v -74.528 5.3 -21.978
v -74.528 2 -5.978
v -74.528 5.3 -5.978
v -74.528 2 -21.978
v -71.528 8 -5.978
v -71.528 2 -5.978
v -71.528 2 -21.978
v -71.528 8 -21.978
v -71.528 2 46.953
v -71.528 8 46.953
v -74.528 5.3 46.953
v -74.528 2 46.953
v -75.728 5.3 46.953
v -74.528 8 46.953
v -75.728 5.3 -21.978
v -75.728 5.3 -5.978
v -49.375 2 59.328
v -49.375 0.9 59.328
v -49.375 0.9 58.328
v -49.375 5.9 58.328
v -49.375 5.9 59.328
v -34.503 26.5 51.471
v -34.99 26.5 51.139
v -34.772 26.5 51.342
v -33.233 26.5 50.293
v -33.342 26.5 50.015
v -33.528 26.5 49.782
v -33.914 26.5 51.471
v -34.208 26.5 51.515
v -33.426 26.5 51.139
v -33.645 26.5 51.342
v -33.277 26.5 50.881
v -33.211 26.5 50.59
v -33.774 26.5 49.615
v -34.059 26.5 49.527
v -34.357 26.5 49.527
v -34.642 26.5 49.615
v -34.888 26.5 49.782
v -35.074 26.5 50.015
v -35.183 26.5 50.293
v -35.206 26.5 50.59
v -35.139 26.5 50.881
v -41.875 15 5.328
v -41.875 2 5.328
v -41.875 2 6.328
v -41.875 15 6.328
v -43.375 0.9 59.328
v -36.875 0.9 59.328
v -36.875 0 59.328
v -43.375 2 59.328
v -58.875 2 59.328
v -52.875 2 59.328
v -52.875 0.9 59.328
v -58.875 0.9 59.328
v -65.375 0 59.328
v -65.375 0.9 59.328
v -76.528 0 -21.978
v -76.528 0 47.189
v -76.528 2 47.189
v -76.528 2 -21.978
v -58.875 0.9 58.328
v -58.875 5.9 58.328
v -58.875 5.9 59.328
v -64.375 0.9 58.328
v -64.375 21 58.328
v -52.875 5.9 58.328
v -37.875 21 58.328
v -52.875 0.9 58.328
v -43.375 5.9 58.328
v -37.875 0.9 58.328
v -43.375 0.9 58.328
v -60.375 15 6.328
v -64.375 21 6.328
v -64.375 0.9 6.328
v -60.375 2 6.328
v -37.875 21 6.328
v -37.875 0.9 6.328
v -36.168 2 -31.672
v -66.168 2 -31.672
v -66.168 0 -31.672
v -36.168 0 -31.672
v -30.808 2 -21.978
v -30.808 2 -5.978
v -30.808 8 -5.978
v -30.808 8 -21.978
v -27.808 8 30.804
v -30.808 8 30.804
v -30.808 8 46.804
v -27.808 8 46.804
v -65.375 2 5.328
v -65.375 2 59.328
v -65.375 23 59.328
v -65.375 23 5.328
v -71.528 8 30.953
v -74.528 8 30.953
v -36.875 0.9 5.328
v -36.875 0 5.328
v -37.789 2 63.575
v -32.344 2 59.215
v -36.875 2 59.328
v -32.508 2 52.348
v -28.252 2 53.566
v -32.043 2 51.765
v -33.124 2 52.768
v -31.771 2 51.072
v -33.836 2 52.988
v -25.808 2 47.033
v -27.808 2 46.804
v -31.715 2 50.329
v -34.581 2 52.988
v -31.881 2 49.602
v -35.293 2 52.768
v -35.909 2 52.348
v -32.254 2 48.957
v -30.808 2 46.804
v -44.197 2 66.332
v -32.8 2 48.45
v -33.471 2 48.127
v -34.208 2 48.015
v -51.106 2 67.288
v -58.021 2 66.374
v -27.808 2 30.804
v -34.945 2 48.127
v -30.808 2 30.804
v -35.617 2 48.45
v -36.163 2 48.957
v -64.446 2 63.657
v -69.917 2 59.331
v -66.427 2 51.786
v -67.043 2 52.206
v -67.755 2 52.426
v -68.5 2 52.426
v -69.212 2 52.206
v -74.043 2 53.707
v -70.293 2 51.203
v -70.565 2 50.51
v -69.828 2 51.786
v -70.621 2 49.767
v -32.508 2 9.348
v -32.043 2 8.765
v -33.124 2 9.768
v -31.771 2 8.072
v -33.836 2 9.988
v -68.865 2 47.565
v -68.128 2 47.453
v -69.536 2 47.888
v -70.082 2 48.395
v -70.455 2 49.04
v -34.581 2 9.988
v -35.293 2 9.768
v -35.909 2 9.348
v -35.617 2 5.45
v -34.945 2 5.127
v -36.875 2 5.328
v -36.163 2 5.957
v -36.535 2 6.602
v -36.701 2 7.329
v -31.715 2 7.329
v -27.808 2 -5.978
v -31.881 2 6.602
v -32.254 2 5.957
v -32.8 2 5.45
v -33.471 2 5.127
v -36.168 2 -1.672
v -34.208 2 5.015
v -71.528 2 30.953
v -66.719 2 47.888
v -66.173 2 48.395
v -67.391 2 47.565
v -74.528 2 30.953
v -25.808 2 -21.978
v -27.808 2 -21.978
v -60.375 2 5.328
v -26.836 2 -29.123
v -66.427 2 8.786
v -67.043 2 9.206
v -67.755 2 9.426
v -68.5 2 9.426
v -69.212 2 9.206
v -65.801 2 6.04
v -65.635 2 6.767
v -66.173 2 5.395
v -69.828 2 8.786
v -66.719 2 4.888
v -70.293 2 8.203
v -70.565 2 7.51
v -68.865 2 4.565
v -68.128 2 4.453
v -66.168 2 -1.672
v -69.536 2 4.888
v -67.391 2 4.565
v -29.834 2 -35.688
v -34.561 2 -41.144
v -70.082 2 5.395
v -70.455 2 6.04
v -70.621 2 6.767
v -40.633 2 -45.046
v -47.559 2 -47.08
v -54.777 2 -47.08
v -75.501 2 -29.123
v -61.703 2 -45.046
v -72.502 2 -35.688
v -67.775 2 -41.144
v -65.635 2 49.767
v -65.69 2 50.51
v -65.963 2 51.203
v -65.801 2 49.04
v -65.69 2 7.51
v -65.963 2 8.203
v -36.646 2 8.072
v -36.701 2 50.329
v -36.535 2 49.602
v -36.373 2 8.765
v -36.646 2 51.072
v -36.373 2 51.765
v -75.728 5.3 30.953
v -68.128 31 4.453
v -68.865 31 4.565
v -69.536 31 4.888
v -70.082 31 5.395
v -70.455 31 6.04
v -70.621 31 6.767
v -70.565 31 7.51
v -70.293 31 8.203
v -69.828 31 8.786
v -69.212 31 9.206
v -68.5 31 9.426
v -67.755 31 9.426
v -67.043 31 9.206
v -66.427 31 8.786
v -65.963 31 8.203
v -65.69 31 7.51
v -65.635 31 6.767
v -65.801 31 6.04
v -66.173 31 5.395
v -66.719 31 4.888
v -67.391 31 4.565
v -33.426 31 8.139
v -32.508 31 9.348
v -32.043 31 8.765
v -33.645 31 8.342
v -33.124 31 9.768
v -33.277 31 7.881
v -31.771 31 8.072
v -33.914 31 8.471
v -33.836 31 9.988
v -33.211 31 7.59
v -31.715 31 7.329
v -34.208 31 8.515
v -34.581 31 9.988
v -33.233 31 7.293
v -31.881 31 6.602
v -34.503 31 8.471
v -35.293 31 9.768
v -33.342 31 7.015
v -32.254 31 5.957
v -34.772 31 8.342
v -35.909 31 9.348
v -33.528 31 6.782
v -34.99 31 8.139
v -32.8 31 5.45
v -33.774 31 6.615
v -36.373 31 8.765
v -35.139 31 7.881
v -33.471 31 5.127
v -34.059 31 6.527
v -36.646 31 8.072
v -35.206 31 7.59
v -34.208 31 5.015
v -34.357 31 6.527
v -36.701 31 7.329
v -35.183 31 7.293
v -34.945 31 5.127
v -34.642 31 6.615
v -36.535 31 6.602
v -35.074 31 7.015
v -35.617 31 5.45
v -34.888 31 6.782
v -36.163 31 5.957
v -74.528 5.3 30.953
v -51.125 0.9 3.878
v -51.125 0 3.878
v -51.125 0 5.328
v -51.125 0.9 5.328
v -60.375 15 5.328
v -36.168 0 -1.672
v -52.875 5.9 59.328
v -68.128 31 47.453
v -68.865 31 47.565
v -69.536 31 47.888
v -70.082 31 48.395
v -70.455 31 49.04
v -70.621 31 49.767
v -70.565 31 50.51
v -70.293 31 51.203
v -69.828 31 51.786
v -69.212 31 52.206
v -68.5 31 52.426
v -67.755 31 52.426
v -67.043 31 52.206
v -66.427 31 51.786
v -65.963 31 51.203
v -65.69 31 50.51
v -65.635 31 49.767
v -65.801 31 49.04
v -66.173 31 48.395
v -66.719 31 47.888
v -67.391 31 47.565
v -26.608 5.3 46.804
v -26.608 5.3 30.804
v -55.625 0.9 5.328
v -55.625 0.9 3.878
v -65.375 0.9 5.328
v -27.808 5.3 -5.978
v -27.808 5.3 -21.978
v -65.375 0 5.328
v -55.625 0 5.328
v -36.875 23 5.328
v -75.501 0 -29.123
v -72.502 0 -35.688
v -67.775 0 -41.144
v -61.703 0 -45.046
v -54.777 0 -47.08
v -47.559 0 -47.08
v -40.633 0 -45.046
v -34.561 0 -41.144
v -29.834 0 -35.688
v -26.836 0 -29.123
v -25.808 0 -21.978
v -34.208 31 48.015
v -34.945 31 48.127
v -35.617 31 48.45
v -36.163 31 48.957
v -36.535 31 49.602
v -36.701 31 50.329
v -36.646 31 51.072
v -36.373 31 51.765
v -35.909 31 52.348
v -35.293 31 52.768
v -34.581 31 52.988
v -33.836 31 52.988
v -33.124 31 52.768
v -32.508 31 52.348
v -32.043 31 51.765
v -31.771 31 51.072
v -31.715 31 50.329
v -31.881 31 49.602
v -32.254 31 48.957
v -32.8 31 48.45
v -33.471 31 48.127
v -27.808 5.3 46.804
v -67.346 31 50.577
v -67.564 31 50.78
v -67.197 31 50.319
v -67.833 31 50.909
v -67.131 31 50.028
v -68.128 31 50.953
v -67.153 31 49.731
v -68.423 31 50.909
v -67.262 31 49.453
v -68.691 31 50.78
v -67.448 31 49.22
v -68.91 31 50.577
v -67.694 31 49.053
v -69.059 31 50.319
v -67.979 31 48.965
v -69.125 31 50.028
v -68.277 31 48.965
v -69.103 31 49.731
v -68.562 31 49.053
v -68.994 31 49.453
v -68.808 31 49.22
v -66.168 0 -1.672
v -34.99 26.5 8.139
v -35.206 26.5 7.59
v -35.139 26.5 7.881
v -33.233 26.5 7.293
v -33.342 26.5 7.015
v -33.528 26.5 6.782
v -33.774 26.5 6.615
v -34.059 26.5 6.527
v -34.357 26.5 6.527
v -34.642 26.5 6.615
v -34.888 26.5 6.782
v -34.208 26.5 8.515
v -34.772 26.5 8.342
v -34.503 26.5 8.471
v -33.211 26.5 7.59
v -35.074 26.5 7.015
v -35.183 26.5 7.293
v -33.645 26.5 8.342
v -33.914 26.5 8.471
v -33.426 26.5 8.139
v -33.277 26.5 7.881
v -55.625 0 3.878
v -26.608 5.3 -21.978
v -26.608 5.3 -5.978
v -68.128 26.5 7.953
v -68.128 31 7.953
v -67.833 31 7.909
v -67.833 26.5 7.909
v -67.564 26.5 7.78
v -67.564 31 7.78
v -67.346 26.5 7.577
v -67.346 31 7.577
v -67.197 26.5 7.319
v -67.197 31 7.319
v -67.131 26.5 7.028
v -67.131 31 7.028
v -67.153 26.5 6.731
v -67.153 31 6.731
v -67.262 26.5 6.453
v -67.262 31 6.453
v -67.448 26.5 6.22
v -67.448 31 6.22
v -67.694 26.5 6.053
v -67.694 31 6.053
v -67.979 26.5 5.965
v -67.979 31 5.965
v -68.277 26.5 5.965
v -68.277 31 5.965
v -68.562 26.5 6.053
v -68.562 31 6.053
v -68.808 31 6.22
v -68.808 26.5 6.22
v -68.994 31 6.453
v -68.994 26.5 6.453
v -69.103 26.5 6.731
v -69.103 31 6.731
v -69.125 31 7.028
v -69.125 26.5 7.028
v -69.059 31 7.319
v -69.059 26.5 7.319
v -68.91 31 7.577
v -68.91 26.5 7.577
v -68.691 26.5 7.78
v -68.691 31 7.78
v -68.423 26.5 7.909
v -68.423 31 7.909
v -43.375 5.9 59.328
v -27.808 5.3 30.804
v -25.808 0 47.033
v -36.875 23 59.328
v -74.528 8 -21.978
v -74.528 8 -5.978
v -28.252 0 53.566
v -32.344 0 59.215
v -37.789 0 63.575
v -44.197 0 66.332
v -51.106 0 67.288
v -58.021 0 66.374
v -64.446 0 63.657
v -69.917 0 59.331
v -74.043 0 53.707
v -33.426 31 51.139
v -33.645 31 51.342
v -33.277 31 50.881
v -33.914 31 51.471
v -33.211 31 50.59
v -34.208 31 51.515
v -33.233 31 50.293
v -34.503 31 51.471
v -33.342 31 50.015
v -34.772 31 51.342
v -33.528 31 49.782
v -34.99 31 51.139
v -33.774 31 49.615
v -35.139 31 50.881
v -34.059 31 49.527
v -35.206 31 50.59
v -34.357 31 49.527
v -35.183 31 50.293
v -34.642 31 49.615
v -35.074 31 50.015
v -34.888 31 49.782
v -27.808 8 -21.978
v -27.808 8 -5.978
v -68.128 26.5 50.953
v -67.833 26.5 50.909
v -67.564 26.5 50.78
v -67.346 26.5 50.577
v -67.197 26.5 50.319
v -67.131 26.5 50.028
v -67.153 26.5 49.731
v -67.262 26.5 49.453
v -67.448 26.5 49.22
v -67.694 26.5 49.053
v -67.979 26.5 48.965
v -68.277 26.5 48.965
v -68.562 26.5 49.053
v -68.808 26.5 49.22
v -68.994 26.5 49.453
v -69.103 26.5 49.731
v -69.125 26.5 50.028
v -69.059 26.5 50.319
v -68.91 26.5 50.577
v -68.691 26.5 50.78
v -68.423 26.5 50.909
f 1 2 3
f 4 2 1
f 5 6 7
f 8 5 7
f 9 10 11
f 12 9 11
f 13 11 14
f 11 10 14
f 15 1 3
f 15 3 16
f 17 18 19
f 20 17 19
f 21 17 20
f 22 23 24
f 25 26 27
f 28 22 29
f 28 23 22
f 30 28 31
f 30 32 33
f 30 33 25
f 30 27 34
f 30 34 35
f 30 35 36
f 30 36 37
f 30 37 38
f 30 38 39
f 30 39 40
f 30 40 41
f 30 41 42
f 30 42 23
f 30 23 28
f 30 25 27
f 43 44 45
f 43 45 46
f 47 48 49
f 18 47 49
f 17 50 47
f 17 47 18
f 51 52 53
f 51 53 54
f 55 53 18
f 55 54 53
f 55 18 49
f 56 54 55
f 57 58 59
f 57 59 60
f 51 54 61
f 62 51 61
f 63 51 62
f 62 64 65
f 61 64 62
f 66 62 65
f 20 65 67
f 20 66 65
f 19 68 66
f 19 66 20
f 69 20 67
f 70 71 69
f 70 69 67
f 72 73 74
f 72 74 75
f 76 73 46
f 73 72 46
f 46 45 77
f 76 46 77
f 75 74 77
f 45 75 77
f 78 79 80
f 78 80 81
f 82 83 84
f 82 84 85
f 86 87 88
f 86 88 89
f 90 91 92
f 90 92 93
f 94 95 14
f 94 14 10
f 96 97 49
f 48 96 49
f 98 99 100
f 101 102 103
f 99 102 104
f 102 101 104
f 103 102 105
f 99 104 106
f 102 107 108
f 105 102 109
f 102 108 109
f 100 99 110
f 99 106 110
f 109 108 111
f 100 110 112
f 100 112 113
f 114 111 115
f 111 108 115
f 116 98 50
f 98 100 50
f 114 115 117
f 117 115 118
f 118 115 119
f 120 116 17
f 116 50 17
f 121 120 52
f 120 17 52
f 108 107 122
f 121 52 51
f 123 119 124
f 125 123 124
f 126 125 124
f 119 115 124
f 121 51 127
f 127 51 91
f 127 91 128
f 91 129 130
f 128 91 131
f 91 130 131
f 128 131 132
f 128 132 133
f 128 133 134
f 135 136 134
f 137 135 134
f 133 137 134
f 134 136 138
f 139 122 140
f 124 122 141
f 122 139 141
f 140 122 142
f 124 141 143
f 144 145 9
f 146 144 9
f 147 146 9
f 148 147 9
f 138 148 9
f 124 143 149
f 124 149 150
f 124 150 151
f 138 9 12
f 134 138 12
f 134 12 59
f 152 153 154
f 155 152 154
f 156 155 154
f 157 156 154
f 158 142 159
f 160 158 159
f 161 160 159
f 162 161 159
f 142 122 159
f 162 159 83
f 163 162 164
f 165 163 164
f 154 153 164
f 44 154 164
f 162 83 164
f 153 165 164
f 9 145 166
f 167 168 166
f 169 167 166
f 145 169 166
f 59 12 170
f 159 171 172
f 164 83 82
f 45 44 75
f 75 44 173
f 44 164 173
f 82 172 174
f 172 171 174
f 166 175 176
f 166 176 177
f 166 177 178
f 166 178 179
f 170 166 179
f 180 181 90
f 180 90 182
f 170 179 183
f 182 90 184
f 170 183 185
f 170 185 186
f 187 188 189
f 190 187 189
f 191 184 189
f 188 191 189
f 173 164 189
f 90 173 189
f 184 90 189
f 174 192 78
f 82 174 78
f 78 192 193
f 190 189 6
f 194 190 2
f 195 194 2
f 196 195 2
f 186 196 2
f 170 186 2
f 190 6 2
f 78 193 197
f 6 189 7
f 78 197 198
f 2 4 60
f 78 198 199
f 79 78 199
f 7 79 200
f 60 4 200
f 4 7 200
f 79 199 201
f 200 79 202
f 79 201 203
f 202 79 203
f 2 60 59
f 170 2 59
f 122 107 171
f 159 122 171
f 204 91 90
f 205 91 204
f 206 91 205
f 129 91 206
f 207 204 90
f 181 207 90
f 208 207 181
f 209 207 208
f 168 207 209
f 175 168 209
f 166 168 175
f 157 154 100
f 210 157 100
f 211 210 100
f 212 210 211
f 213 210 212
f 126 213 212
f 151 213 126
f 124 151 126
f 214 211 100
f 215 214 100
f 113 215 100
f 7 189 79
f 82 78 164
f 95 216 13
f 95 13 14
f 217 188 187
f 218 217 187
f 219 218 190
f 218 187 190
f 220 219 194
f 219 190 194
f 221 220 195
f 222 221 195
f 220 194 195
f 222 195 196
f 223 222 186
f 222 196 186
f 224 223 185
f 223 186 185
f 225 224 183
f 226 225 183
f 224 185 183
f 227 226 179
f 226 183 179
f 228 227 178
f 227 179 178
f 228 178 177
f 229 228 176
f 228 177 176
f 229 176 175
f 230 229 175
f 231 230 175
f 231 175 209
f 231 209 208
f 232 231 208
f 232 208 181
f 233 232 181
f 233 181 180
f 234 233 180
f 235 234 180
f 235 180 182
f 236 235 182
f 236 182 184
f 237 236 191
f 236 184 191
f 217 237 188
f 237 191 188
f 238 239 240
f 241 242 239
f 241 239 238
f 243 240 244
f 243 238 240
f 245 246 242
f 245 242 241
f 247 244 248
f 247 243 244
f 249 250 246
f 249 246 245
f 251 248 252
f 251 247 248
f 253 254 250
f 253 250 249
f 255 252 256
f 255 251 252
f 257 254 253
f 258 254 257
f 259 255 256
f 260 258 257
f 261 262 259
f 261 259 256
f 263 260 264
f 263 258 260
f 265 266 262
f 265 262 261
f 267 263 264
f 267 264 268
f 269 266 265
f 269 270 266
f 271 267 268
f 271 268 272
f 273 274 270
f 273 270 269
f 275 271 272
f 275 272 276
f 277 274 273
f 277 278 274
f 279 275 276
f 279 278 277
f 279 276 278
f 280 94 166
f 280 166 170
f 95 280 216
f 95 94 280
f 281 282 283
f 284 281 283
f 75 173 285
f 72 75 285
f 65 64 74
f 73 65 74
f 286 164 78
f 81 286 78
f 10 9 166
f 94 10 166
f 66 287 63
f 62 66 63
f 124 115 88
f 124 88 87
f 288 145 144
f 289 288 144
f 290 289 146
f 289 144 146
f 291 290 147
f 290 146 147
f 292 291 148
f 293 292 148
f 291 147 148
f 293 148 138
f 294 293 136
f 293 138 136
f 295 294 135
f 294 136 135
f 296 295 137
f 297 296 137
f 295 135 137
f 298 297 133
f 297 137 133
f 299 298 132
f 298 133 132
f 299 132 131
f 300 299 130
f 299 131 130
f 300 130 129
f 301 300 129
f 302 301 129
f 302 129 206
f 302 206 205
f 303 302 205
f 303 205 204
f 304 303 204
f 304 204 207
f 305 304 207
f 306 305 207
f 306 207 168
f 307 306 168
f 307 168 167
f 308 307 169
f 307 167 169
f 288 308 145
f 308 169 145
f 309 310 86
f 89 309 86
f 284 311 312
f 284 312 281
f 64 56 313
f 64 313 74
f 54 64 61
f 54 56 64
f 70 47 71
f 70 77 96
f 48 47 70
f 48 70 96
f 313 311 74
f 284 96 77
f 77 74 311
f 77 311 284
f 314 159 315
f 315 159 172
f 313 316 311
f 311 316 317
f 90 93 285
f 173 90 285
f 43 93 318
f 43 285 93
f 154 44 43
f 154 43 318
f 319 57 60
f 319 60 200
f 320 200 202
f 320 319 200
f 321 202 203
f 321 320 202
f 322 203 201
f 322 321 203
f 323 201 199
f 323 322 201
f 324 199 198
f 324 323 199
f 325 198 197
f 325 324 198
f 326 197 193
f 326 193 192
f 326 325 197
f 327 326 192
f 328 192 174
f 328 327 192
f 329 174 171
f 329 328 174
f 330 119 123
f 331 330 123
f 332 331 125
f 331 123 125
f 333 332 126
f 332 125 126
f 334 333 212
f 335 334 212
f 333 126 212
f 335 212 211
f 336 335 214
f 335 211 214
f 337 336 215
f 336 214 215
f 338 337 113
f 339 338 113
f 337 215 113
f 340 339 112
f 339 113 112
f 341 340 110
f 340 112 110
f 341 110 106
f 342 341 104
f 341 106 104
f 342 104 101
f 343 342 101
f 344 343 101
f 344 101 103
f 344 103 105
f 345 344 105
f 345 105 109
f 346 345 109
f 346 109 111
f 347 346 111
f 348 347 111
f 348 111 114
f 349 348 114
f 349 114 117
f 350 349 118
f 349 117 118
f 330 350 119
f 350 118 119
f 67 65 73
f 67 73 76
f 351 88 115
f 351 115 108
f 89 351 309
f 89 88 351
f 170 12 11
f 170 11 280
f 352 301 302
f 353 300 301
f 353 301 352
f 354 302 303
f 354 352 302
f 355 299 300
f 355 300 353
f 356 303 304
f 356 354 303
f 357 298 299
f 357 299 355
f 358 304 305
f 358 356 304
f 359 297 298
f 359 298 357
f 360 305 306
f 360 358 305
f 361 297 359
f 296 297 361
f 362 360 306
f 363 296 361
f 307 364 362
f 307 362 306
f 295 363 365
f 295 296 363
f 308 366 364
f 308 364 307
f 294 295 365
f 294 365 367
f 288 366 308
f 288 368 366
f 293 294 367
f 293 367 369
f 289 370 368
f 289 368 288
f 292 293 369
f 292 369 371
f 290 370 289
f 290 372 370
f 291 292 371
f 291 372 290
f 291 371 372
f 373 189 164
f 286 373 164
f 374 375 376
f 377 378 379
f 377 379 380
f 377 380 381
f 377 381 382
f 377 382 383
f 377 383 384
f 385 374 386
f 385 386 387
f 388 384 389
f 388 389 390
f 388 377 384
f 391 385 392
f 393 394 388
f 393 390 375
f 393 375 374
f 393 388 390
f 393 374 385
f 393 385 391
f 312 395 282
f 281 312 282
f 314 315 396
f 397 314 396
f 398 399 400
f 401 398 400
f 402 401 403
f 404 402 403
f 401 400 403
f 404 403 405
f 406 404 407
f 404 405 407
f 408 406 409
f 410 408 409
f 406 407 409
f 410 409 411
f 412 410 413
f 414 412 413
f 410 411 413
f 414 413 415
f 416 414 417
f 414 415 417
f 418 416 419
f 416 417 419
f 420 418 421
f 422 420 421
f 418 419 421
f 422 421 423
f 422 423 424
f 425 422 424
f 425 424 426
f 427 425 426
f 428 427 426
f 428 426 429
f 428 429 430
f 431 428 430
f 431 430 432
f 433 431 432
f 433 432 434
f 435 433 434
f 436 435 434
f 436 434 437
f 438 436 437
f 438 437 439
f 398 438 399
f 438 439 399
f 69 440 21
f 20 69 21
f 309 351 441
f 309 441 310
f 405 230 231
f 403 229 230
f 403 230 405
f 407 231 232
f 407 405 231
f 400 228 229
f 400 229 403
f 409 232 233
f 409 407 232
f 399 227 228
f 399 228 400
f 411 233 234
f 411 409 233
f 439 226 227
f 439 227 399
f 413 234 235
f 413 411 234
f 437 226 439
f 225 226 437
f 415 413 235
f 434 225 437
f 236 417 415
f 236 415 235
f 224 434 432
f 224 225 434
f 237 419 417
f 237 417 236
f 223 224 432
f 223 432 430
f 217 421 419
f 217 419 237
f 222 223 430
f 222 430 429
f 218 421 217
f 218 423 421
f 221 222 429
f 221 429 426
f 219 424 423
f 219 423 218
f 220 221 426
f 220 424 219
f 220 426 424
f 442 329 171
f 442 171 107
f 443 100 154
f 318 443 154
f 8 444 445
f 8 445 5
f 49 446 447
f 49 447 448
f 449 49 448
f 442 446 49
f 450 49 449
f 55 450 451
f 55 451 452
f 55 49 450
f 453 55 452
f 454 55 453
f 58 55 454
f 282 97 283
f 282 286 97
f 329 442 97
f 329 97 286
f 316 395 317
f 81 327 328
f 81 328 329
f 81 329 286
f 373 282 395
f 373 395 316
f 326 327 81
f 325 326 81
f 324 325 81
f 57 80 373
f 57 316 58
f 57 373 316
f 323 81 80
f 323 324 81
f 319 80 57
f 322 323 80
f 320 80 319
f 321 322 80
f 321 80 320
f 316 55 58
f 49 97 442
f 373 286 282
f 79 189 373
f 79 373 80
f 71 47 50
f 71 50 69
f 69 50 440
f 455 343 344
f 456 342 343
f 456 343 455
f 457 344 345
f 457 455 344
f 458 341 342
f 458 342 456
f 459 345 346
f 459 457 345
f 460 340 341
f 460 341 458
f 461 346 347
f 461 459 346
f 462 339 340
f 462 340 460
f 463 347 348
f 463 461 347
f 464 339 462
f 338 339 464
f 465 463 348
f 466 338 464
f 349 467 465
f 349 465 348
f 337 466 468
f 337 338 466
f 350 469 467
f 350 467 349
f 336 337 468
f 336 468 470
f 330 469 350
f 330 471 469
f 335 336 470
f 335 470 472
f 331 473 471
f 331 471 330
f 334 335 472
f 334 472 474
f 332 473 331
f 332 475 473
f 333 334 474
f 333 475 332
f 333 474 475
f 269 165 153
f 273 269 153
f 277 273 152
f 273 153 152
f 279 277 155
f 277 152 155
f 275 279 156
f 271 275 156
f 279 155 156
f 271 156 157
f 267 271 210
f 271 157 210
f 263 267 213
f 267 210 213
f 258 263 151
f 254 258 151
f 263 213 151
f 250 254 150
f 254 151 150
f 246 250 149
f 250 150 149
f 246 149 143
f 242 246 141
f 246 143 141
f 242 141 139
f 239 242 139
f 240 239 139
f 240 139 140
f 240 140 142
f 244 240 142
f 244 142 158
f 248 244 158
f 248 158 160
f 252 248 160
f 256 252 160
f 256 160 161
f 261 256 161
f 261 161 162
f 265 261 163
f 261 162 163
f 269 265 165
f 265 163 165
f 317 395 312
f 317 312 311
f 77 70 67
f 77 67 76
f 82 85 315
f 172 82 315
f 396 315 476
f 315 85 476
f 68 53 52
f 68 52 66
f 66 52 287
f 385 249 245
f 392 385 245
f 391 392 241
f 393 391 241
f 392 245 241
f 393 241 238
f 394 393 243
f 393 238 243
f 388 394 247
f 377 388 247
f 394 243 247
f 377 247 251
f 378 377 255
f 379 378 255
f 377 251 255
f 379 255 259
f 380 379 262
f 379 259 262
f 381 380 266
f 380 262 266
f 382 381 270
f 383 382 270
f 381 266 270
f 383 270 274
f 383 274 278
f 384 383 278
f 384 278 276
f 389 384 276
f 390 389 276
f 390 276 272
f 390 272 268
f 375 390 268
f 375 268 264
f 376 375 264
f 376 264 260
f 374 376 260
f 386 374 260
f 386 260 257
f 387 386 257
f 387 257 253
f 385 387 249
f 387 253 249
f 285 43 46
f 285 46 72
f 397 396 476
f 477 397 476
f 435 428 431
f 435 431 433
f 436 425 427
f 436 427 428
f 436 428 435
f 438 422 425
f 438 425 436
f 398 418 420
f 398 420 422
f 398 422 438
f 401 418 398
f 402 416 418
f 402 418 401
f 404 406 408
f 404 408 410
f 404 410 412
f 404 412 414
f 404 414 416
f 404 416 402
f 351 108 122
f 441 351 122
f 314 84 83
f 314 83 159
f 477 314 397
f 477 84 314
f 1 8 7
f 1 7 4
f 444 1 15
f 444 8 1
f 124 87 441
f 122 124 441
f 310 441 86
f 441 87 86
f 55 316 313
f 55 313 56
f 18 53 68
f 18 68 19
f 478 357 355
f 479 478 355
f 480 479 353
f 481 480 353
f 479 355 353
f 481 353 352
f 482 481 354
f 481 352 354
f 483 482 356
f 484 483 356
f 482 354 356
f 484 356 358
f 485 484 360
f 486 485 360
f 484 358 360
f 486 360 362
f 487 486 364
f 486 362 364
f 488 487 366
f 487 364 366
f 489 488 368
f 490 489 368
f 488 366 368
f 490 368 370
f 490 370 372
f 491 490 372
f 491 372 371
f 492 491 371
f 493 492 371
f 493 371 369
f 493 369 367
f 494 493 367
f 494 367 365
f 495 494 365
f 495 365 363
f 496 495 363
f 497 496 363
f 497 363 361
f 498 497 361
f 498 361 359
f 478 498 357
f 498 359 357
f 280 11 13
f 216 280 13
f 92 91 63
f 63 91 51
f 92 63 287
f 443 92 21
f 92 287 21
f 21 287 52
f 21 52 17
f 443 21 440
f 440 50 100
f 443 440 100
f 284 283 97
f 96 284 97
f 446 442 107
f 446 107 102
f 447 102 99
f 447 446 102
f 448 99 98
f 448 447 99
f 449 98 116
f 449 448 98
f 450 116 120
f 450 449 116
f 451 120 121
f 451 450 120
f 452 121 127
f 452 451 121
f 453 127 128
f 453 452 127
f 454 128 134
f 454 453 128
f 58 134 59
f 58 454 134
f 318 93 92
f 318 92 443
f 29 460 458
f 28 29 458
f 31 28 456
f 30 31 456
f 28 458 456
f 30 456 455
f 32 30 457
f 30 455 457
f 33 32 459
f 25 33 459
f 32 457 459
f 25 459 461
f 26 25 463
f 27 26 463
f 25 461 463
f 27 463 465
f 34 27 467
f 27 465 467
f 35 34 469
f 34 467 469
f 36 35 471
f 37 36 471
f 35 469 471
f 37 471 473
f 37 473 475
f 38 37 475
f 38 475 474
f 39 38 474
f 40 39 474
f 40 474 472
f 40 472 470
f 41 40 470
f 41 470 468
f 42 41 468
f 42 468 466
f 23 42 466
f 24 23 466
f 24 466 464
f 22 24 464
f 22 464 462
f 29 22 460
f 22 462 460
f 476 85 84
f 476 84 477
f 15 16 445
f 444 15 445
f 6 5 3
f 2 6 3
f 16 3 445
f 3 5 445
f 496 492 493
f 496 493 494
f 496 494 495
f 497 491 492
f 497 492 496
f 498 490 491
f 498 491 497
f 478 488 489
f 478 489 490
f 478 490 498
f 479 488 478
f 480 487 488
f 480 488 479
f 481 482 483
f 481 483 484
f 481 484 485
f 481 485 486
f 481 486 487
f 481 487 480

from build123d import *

# Parameters (mm, degrees)
SALIENTE_EXTRUIR1_DEPTH    = 2
CROQUIS3_W                 = 28.5
CROQUIS3_H                 = 54
SALIENTE_EXTRUIR2_DEPTH    = 21
CORTAR_EXTRUIR2_DEPTH      = 21
CORTAR_EXTRUIR2_DEPTH_BACK = 61
CORTAR_EXTRUIR2_START      = -23
CROQUIS7_W                 = 26.5
CROQUIS7_H                 = 52
CROQUIS10_W                = 18.5
CROQUIS10_H                = 13
CORTAR_EXTRUIR3_DEPTH      = 10
CROQUIS11_W                = 28.5
CROQUIS11_H                = 54
CORTAR_EXTRUIR4_DEPTH      = 0.9
CROQUIS12_W                = 30
CROQUIS12_H                = 30
CORTAR_EXTRUIR6_DEPTH      = 20.6
CROQUIS13_W                = 3
CROQUIS13_H                = 16
SALIENTE_EXTRUIR5_DEPTH    = 6
SALIENTE_EXTRUIR9_DEPTH    = 16
SALIENTE_EXTRUIR10_DEPTH   = 16
SALIENTE_EXTRUIR11_DEPTH   = 16
SALIENTE_EXTRUIR12_DEPTH   = 16
CROQUIS25_W                = 4.5
CROQUIS25_H                = 1.45
CORTAR_EXTRUIR7_DEPTH      = 0.9
CORTAR_EXTRUIR9_DEPTH      = 0.9
CORTAR_EXTRUIR9_DEPTH_BACK = 1
CROQUIS26_W                = 6
CROQUIS26_H                = 5
CROQUIS32_R                = 2.5
SALIENTE_EXTRUIR13_DEPTH   = 29
CROQUIS36_R                = 1
CORTAR_EXTRUIR10_DEPTH     = 4.5
CROQUIS39_R                = 1
CORTAR_EXTRUIR11_DEPTH     = 4.5
CROQUIS38_R                = 1
CORTAR_EXTRUIR12_DEPTH     = 4.5
CROQUIS37_R                = 1
CORTAR_EXTRUIR13_DEPTH     = 4.5


with BuildPart() as part:
    # Croquis1 → Saliente-Extruir1 (new body)
    with BuildSketch(Plane(origin=(0, 0, 0), x_dir=(1, 0, 0), z_dir=(0, 1, 0))):
        with BuildLine():
            Line((-76.52774776, -47.188914739), (-76.52774776, 21.977990865))
            ThreePointArc((-76.52774776, 21.977990865), (-51.168030611, 47.337708015), (-25.808313462, 21.977990865))
            Line((-25.808313462, 21.977990865), (-25.808313462, -47.033075243))
            ThreePointArc((-25.808313462, -47.033075243), (-51.106035712, -67.287819919), (-76.52774776, -47.188914739))
        make_face()
    extrude(amount=SALIENTE_EXTRUIR1_DEPTH)

    # Croquis3 → Saliente-Extruir2 (add)
    with BuildSketch(Plane(origin=(0, 2, 0), x_dir=(1, 0, 0), z_dir=(0, 1, 0))):
        with Locations((-51.124943413, -32.32840731)):
            Rectangle(CROQUIS3_W, CROQUIS3_H)
    extrude(amount=SALIENTE_EXTRUIR2_DEPTH)

    # Croquis7 → Cortar-Extruir2 (cut, two sides: drawn at the far end of the back side and taken through both)
    with BuildSketch(Plane(origin=(0, 23, 0), x_dir=(1, 0, 0), z_dir=(0, 1, 0)).offset(CORTAR_EXTRUIR2_START - CORTAR_EXTRUIR2_DEPTH_BACK)):
        with Locations((-51.124943413, -32.32840731)):
            Rectangle(CROQUIS7_W, CROQUIS7_H)
    extrude(amount=CORTAR_EXTRUIR2_DEPTH + CORTAR_EXTRUIR2_DEPTH_BACK, mode=Mode.SUBTRACT)

    # Croquis10 → Cortar-Extruir3 (cut)
    with BuildSketch(Plane(origin=(0, 0, 5.32840731), x_dir=(-1, 0, 0), z_dir=(0, 0, -1))):
        with Locations((51.124943413, 8.5)):
            Rectangle(CROQUIS10_W, CROQUIS10_H)
    extrude(amount=-CORTAR_EXTRUIR3_DEPTH, mode=Mode.SUBTRACT)

    # Croquis11 → Cortar-Extruir4 (cut)
    with BuildSketch(Plane.XZ):
        with Locations((-51.124943413, 32.32840731)):
            Rectangle(CROQUIS11_W, CROQUIS11_H)
    extrude(amount=-CORTAR_EXTRUIR4_DEPTH, mode=Mode.SUBTRACT)

    # Croquis12 → Cortar-Extruir6 (cut)
    with BuildSketch(Plane(origin=(0, 2, 0), x_dir=(1, 0, 0), z_dir=(0, 1, 0))):
        with Locations((-51.168030611, 16.67159269)):
            Rectangle(CROQUIS12_W, CROQUIS12_H)
    extrude(amount=-CORTAR_EXTRUIR6_DEPTH, mode=Mode.SUBTRACT)

    # Croquis13 → Saliente-Extruir5 (add)
    with BuildSketch(Plane(origin=(0, 2, 0), x_dir=(1, 0, 0), z_dir=(0, 1, 0))):
        with Locations((-29.308313462, -38.804003852)):
            Rectangle(CROQUIS13_W, CROQUIS13_H)
        with Locations((-73.02774776, -38.95348914)):
            Rectangle(CROQUIS13_W, CROQUIS13_H)
        with Locations((-73.02774776, 13.977990865)):
            Rectangle(CROQUIS13_W, CROQUIS13_H)
        with Locations((-29.308313462, 13.977990865)):
            Rectangle(CROQUIS13_W, CROQUIS13_H)
    extrude(amount=SALIENTE_EXTRUIR5_DEPTH)

    # Croquis18 → Saliente-Extruir9 (add)
    with BuildSketch(Plane.XY.offset(46.804003852)):
        Polygon((-27.808313462, 8), (-27.808313462, 5.3), (-26.608313462, 5.3), align=None)
    extrude(amount=-SALIENTE_EXTRUIR9_DEPTH)

    # Croquis21 → Saliente-Extruir10 (add)
    with BuildSketch(Plane.XY.offset(46.95348914)):
        Polygon((-74.52774776, 8), (-74.52774776, 5.3), (-75.72774776, 5.3), align=None)
    extrude(amount=-SALIENTE_EXTRUIR10_DEPTH)

    # Croquis22 → Saliente-Extruir11 (add)
    with BuildSketch(Plane(origin=(0, 0, -21.977990865), x_dir=(-1, 0, 0), z_dir=(0, 0, -1))):
        Polygon((27.808313462, 8), (27.808313462, 5.3), (26.608313462, 5.3), align=None)
    extrude(amount=-SALIENTE_EXTRUIR11_DEPTH)

    # Croquis23 → Saliente-Extruir12 (add)
    with BuildSketch(Plane(origin=(0, 0, -21.977990865), x_dir=(-1, 0, 0), z_dir=(0, 0, -1))):
        Polygon((74.52774776, 8), (74.52774776, 5.3), (75.72774776, 5.3), align=None)
    extrude(amount=-SALIENTE_EXTRUIR12_DEPTH)

    # Croquis25 → Cortar-Extruir7 (cut)
    with BuildSketch(Plane.XZ):
        with Locations((-53.374943413, 4.60340731)):
            Rectangle(CROQUIS25_W, CROQUIS25_H)
    extrude(amount=-CORTAR_EXTRUIR7_DEPTH, mode=Mode.SUBTRACT)

    # Croquis26 → Cortar-Extruir9 (cut, two sides: drawn at the far end of the back side and taken through both)
    with BuildSketch(Plane(origin=(0, 0, 58.32840731), x_dir=(-1, 0, 0), z_dir=(0, 0, -1)).offset(-CORTAR_EXTRUIR9_DEPTH_BACK)):
        with Locations((55.874943413, 3.4)):
            Rectangle(CROQUIS26_W, CROQUIS26_H)
        with Locations((46.374943413, 3.4)):
            Rectangle(CROQUIS26_W, CROQUIS26_H)
    extrude(amount=CORTAR_EXTRUIR9_DEPTH + CORTAR_EXTRUIR9_DEPTH_BACK, mode=Mode.SUBTRACT)

    # Croquis32 → Saliente-Extruir13 (add)
    with BuildSketch(Plane(origin=(0, 2, 0), x_dir=(1, 0, 0), z_dir=(0, 1, 0))):
        with Locations(Location((-68.12774776, -49.95348914, 0), (0, 0, 90))):
            Circle(CROQUIS32_R)
        with Locations(Location((-68.12774776, -6.95348914, 0), (0, 0, 90))):
            Circle(CROQUIS32_R)
        with Locations(Location((-34.208313462, -50.515469487, 0), (0, 0, 90))):
            Circle(CROQUIS32_R)
        with Locations(Location((-34.208313462, -7.515469487, 0), (0, 0, 90))):
            Circle(CROQUIS32_R)
    extrude(amount=SALIENTE_EXTRUIR13_DEPTH)

    # Croquis36 → Cortar-Extruir10 (cut)
    with BuildSketch(Plane(origin=(0, 31, 0), x_dir=(1, 0, 0), z_dir=(0, 1, 0))):
        with Locations(Location((-68.12774776, -6.95348914, 0), (0, 0, 270))):
            Circle(CROQUIS36_R)
    extrude(amount=-CORTAR_EXTRUIR10_DEPTH, mode=Mode.SUBTRACT)

    # Croquis39 → Cortar-Extruir11 (cut)
    with BuildSketch(Plane(origin=(0, 31, 0), x_dir=(1, 0, 0), z_dir=(0, 1, 0))):
        with Locations(Location((-68.12774776, -49.95348914, 0), (0, 0, 270))):
            Circle(CROQUIS39_R)
    extrude(amount=-CORTAR_EXTRUIR11_DEPTH, mode=Mode.SUBTRACT)

    # Croquis38 → Cortar-Extruir12 (cut)
    with BuildSketch(Plane(origin=(0, 31, 0), x_dir=(1, 0, 0), z_dir=(0, 1, 0))):
        with Locations(Location((-34.208313462, -50.515469487, 0), (0, 0, 270))):
            Circle(CROQUIS38_R)
    extrude(amount=-CORTAR_EXTRUIR12_DEPTH, mode=Mode.SUBTRACT)

    # Croquis37 → Cortar-Extruir13 (cut)
    with BuildSketch(Plane(origin=(0, 31, 0), x_dir=(1, 0, 0), z_dir=(0, 1, 0))):
        with Locations(Location((-34.208313462, -7.515469487, 0), (0, 0, 270))):
            Circle(CROQUIS37_R)
    extrude(amount=-CORTAR_EXTRUIR13_DEPTH, mode=Mode.SUBTRACT)


solid = part.part
